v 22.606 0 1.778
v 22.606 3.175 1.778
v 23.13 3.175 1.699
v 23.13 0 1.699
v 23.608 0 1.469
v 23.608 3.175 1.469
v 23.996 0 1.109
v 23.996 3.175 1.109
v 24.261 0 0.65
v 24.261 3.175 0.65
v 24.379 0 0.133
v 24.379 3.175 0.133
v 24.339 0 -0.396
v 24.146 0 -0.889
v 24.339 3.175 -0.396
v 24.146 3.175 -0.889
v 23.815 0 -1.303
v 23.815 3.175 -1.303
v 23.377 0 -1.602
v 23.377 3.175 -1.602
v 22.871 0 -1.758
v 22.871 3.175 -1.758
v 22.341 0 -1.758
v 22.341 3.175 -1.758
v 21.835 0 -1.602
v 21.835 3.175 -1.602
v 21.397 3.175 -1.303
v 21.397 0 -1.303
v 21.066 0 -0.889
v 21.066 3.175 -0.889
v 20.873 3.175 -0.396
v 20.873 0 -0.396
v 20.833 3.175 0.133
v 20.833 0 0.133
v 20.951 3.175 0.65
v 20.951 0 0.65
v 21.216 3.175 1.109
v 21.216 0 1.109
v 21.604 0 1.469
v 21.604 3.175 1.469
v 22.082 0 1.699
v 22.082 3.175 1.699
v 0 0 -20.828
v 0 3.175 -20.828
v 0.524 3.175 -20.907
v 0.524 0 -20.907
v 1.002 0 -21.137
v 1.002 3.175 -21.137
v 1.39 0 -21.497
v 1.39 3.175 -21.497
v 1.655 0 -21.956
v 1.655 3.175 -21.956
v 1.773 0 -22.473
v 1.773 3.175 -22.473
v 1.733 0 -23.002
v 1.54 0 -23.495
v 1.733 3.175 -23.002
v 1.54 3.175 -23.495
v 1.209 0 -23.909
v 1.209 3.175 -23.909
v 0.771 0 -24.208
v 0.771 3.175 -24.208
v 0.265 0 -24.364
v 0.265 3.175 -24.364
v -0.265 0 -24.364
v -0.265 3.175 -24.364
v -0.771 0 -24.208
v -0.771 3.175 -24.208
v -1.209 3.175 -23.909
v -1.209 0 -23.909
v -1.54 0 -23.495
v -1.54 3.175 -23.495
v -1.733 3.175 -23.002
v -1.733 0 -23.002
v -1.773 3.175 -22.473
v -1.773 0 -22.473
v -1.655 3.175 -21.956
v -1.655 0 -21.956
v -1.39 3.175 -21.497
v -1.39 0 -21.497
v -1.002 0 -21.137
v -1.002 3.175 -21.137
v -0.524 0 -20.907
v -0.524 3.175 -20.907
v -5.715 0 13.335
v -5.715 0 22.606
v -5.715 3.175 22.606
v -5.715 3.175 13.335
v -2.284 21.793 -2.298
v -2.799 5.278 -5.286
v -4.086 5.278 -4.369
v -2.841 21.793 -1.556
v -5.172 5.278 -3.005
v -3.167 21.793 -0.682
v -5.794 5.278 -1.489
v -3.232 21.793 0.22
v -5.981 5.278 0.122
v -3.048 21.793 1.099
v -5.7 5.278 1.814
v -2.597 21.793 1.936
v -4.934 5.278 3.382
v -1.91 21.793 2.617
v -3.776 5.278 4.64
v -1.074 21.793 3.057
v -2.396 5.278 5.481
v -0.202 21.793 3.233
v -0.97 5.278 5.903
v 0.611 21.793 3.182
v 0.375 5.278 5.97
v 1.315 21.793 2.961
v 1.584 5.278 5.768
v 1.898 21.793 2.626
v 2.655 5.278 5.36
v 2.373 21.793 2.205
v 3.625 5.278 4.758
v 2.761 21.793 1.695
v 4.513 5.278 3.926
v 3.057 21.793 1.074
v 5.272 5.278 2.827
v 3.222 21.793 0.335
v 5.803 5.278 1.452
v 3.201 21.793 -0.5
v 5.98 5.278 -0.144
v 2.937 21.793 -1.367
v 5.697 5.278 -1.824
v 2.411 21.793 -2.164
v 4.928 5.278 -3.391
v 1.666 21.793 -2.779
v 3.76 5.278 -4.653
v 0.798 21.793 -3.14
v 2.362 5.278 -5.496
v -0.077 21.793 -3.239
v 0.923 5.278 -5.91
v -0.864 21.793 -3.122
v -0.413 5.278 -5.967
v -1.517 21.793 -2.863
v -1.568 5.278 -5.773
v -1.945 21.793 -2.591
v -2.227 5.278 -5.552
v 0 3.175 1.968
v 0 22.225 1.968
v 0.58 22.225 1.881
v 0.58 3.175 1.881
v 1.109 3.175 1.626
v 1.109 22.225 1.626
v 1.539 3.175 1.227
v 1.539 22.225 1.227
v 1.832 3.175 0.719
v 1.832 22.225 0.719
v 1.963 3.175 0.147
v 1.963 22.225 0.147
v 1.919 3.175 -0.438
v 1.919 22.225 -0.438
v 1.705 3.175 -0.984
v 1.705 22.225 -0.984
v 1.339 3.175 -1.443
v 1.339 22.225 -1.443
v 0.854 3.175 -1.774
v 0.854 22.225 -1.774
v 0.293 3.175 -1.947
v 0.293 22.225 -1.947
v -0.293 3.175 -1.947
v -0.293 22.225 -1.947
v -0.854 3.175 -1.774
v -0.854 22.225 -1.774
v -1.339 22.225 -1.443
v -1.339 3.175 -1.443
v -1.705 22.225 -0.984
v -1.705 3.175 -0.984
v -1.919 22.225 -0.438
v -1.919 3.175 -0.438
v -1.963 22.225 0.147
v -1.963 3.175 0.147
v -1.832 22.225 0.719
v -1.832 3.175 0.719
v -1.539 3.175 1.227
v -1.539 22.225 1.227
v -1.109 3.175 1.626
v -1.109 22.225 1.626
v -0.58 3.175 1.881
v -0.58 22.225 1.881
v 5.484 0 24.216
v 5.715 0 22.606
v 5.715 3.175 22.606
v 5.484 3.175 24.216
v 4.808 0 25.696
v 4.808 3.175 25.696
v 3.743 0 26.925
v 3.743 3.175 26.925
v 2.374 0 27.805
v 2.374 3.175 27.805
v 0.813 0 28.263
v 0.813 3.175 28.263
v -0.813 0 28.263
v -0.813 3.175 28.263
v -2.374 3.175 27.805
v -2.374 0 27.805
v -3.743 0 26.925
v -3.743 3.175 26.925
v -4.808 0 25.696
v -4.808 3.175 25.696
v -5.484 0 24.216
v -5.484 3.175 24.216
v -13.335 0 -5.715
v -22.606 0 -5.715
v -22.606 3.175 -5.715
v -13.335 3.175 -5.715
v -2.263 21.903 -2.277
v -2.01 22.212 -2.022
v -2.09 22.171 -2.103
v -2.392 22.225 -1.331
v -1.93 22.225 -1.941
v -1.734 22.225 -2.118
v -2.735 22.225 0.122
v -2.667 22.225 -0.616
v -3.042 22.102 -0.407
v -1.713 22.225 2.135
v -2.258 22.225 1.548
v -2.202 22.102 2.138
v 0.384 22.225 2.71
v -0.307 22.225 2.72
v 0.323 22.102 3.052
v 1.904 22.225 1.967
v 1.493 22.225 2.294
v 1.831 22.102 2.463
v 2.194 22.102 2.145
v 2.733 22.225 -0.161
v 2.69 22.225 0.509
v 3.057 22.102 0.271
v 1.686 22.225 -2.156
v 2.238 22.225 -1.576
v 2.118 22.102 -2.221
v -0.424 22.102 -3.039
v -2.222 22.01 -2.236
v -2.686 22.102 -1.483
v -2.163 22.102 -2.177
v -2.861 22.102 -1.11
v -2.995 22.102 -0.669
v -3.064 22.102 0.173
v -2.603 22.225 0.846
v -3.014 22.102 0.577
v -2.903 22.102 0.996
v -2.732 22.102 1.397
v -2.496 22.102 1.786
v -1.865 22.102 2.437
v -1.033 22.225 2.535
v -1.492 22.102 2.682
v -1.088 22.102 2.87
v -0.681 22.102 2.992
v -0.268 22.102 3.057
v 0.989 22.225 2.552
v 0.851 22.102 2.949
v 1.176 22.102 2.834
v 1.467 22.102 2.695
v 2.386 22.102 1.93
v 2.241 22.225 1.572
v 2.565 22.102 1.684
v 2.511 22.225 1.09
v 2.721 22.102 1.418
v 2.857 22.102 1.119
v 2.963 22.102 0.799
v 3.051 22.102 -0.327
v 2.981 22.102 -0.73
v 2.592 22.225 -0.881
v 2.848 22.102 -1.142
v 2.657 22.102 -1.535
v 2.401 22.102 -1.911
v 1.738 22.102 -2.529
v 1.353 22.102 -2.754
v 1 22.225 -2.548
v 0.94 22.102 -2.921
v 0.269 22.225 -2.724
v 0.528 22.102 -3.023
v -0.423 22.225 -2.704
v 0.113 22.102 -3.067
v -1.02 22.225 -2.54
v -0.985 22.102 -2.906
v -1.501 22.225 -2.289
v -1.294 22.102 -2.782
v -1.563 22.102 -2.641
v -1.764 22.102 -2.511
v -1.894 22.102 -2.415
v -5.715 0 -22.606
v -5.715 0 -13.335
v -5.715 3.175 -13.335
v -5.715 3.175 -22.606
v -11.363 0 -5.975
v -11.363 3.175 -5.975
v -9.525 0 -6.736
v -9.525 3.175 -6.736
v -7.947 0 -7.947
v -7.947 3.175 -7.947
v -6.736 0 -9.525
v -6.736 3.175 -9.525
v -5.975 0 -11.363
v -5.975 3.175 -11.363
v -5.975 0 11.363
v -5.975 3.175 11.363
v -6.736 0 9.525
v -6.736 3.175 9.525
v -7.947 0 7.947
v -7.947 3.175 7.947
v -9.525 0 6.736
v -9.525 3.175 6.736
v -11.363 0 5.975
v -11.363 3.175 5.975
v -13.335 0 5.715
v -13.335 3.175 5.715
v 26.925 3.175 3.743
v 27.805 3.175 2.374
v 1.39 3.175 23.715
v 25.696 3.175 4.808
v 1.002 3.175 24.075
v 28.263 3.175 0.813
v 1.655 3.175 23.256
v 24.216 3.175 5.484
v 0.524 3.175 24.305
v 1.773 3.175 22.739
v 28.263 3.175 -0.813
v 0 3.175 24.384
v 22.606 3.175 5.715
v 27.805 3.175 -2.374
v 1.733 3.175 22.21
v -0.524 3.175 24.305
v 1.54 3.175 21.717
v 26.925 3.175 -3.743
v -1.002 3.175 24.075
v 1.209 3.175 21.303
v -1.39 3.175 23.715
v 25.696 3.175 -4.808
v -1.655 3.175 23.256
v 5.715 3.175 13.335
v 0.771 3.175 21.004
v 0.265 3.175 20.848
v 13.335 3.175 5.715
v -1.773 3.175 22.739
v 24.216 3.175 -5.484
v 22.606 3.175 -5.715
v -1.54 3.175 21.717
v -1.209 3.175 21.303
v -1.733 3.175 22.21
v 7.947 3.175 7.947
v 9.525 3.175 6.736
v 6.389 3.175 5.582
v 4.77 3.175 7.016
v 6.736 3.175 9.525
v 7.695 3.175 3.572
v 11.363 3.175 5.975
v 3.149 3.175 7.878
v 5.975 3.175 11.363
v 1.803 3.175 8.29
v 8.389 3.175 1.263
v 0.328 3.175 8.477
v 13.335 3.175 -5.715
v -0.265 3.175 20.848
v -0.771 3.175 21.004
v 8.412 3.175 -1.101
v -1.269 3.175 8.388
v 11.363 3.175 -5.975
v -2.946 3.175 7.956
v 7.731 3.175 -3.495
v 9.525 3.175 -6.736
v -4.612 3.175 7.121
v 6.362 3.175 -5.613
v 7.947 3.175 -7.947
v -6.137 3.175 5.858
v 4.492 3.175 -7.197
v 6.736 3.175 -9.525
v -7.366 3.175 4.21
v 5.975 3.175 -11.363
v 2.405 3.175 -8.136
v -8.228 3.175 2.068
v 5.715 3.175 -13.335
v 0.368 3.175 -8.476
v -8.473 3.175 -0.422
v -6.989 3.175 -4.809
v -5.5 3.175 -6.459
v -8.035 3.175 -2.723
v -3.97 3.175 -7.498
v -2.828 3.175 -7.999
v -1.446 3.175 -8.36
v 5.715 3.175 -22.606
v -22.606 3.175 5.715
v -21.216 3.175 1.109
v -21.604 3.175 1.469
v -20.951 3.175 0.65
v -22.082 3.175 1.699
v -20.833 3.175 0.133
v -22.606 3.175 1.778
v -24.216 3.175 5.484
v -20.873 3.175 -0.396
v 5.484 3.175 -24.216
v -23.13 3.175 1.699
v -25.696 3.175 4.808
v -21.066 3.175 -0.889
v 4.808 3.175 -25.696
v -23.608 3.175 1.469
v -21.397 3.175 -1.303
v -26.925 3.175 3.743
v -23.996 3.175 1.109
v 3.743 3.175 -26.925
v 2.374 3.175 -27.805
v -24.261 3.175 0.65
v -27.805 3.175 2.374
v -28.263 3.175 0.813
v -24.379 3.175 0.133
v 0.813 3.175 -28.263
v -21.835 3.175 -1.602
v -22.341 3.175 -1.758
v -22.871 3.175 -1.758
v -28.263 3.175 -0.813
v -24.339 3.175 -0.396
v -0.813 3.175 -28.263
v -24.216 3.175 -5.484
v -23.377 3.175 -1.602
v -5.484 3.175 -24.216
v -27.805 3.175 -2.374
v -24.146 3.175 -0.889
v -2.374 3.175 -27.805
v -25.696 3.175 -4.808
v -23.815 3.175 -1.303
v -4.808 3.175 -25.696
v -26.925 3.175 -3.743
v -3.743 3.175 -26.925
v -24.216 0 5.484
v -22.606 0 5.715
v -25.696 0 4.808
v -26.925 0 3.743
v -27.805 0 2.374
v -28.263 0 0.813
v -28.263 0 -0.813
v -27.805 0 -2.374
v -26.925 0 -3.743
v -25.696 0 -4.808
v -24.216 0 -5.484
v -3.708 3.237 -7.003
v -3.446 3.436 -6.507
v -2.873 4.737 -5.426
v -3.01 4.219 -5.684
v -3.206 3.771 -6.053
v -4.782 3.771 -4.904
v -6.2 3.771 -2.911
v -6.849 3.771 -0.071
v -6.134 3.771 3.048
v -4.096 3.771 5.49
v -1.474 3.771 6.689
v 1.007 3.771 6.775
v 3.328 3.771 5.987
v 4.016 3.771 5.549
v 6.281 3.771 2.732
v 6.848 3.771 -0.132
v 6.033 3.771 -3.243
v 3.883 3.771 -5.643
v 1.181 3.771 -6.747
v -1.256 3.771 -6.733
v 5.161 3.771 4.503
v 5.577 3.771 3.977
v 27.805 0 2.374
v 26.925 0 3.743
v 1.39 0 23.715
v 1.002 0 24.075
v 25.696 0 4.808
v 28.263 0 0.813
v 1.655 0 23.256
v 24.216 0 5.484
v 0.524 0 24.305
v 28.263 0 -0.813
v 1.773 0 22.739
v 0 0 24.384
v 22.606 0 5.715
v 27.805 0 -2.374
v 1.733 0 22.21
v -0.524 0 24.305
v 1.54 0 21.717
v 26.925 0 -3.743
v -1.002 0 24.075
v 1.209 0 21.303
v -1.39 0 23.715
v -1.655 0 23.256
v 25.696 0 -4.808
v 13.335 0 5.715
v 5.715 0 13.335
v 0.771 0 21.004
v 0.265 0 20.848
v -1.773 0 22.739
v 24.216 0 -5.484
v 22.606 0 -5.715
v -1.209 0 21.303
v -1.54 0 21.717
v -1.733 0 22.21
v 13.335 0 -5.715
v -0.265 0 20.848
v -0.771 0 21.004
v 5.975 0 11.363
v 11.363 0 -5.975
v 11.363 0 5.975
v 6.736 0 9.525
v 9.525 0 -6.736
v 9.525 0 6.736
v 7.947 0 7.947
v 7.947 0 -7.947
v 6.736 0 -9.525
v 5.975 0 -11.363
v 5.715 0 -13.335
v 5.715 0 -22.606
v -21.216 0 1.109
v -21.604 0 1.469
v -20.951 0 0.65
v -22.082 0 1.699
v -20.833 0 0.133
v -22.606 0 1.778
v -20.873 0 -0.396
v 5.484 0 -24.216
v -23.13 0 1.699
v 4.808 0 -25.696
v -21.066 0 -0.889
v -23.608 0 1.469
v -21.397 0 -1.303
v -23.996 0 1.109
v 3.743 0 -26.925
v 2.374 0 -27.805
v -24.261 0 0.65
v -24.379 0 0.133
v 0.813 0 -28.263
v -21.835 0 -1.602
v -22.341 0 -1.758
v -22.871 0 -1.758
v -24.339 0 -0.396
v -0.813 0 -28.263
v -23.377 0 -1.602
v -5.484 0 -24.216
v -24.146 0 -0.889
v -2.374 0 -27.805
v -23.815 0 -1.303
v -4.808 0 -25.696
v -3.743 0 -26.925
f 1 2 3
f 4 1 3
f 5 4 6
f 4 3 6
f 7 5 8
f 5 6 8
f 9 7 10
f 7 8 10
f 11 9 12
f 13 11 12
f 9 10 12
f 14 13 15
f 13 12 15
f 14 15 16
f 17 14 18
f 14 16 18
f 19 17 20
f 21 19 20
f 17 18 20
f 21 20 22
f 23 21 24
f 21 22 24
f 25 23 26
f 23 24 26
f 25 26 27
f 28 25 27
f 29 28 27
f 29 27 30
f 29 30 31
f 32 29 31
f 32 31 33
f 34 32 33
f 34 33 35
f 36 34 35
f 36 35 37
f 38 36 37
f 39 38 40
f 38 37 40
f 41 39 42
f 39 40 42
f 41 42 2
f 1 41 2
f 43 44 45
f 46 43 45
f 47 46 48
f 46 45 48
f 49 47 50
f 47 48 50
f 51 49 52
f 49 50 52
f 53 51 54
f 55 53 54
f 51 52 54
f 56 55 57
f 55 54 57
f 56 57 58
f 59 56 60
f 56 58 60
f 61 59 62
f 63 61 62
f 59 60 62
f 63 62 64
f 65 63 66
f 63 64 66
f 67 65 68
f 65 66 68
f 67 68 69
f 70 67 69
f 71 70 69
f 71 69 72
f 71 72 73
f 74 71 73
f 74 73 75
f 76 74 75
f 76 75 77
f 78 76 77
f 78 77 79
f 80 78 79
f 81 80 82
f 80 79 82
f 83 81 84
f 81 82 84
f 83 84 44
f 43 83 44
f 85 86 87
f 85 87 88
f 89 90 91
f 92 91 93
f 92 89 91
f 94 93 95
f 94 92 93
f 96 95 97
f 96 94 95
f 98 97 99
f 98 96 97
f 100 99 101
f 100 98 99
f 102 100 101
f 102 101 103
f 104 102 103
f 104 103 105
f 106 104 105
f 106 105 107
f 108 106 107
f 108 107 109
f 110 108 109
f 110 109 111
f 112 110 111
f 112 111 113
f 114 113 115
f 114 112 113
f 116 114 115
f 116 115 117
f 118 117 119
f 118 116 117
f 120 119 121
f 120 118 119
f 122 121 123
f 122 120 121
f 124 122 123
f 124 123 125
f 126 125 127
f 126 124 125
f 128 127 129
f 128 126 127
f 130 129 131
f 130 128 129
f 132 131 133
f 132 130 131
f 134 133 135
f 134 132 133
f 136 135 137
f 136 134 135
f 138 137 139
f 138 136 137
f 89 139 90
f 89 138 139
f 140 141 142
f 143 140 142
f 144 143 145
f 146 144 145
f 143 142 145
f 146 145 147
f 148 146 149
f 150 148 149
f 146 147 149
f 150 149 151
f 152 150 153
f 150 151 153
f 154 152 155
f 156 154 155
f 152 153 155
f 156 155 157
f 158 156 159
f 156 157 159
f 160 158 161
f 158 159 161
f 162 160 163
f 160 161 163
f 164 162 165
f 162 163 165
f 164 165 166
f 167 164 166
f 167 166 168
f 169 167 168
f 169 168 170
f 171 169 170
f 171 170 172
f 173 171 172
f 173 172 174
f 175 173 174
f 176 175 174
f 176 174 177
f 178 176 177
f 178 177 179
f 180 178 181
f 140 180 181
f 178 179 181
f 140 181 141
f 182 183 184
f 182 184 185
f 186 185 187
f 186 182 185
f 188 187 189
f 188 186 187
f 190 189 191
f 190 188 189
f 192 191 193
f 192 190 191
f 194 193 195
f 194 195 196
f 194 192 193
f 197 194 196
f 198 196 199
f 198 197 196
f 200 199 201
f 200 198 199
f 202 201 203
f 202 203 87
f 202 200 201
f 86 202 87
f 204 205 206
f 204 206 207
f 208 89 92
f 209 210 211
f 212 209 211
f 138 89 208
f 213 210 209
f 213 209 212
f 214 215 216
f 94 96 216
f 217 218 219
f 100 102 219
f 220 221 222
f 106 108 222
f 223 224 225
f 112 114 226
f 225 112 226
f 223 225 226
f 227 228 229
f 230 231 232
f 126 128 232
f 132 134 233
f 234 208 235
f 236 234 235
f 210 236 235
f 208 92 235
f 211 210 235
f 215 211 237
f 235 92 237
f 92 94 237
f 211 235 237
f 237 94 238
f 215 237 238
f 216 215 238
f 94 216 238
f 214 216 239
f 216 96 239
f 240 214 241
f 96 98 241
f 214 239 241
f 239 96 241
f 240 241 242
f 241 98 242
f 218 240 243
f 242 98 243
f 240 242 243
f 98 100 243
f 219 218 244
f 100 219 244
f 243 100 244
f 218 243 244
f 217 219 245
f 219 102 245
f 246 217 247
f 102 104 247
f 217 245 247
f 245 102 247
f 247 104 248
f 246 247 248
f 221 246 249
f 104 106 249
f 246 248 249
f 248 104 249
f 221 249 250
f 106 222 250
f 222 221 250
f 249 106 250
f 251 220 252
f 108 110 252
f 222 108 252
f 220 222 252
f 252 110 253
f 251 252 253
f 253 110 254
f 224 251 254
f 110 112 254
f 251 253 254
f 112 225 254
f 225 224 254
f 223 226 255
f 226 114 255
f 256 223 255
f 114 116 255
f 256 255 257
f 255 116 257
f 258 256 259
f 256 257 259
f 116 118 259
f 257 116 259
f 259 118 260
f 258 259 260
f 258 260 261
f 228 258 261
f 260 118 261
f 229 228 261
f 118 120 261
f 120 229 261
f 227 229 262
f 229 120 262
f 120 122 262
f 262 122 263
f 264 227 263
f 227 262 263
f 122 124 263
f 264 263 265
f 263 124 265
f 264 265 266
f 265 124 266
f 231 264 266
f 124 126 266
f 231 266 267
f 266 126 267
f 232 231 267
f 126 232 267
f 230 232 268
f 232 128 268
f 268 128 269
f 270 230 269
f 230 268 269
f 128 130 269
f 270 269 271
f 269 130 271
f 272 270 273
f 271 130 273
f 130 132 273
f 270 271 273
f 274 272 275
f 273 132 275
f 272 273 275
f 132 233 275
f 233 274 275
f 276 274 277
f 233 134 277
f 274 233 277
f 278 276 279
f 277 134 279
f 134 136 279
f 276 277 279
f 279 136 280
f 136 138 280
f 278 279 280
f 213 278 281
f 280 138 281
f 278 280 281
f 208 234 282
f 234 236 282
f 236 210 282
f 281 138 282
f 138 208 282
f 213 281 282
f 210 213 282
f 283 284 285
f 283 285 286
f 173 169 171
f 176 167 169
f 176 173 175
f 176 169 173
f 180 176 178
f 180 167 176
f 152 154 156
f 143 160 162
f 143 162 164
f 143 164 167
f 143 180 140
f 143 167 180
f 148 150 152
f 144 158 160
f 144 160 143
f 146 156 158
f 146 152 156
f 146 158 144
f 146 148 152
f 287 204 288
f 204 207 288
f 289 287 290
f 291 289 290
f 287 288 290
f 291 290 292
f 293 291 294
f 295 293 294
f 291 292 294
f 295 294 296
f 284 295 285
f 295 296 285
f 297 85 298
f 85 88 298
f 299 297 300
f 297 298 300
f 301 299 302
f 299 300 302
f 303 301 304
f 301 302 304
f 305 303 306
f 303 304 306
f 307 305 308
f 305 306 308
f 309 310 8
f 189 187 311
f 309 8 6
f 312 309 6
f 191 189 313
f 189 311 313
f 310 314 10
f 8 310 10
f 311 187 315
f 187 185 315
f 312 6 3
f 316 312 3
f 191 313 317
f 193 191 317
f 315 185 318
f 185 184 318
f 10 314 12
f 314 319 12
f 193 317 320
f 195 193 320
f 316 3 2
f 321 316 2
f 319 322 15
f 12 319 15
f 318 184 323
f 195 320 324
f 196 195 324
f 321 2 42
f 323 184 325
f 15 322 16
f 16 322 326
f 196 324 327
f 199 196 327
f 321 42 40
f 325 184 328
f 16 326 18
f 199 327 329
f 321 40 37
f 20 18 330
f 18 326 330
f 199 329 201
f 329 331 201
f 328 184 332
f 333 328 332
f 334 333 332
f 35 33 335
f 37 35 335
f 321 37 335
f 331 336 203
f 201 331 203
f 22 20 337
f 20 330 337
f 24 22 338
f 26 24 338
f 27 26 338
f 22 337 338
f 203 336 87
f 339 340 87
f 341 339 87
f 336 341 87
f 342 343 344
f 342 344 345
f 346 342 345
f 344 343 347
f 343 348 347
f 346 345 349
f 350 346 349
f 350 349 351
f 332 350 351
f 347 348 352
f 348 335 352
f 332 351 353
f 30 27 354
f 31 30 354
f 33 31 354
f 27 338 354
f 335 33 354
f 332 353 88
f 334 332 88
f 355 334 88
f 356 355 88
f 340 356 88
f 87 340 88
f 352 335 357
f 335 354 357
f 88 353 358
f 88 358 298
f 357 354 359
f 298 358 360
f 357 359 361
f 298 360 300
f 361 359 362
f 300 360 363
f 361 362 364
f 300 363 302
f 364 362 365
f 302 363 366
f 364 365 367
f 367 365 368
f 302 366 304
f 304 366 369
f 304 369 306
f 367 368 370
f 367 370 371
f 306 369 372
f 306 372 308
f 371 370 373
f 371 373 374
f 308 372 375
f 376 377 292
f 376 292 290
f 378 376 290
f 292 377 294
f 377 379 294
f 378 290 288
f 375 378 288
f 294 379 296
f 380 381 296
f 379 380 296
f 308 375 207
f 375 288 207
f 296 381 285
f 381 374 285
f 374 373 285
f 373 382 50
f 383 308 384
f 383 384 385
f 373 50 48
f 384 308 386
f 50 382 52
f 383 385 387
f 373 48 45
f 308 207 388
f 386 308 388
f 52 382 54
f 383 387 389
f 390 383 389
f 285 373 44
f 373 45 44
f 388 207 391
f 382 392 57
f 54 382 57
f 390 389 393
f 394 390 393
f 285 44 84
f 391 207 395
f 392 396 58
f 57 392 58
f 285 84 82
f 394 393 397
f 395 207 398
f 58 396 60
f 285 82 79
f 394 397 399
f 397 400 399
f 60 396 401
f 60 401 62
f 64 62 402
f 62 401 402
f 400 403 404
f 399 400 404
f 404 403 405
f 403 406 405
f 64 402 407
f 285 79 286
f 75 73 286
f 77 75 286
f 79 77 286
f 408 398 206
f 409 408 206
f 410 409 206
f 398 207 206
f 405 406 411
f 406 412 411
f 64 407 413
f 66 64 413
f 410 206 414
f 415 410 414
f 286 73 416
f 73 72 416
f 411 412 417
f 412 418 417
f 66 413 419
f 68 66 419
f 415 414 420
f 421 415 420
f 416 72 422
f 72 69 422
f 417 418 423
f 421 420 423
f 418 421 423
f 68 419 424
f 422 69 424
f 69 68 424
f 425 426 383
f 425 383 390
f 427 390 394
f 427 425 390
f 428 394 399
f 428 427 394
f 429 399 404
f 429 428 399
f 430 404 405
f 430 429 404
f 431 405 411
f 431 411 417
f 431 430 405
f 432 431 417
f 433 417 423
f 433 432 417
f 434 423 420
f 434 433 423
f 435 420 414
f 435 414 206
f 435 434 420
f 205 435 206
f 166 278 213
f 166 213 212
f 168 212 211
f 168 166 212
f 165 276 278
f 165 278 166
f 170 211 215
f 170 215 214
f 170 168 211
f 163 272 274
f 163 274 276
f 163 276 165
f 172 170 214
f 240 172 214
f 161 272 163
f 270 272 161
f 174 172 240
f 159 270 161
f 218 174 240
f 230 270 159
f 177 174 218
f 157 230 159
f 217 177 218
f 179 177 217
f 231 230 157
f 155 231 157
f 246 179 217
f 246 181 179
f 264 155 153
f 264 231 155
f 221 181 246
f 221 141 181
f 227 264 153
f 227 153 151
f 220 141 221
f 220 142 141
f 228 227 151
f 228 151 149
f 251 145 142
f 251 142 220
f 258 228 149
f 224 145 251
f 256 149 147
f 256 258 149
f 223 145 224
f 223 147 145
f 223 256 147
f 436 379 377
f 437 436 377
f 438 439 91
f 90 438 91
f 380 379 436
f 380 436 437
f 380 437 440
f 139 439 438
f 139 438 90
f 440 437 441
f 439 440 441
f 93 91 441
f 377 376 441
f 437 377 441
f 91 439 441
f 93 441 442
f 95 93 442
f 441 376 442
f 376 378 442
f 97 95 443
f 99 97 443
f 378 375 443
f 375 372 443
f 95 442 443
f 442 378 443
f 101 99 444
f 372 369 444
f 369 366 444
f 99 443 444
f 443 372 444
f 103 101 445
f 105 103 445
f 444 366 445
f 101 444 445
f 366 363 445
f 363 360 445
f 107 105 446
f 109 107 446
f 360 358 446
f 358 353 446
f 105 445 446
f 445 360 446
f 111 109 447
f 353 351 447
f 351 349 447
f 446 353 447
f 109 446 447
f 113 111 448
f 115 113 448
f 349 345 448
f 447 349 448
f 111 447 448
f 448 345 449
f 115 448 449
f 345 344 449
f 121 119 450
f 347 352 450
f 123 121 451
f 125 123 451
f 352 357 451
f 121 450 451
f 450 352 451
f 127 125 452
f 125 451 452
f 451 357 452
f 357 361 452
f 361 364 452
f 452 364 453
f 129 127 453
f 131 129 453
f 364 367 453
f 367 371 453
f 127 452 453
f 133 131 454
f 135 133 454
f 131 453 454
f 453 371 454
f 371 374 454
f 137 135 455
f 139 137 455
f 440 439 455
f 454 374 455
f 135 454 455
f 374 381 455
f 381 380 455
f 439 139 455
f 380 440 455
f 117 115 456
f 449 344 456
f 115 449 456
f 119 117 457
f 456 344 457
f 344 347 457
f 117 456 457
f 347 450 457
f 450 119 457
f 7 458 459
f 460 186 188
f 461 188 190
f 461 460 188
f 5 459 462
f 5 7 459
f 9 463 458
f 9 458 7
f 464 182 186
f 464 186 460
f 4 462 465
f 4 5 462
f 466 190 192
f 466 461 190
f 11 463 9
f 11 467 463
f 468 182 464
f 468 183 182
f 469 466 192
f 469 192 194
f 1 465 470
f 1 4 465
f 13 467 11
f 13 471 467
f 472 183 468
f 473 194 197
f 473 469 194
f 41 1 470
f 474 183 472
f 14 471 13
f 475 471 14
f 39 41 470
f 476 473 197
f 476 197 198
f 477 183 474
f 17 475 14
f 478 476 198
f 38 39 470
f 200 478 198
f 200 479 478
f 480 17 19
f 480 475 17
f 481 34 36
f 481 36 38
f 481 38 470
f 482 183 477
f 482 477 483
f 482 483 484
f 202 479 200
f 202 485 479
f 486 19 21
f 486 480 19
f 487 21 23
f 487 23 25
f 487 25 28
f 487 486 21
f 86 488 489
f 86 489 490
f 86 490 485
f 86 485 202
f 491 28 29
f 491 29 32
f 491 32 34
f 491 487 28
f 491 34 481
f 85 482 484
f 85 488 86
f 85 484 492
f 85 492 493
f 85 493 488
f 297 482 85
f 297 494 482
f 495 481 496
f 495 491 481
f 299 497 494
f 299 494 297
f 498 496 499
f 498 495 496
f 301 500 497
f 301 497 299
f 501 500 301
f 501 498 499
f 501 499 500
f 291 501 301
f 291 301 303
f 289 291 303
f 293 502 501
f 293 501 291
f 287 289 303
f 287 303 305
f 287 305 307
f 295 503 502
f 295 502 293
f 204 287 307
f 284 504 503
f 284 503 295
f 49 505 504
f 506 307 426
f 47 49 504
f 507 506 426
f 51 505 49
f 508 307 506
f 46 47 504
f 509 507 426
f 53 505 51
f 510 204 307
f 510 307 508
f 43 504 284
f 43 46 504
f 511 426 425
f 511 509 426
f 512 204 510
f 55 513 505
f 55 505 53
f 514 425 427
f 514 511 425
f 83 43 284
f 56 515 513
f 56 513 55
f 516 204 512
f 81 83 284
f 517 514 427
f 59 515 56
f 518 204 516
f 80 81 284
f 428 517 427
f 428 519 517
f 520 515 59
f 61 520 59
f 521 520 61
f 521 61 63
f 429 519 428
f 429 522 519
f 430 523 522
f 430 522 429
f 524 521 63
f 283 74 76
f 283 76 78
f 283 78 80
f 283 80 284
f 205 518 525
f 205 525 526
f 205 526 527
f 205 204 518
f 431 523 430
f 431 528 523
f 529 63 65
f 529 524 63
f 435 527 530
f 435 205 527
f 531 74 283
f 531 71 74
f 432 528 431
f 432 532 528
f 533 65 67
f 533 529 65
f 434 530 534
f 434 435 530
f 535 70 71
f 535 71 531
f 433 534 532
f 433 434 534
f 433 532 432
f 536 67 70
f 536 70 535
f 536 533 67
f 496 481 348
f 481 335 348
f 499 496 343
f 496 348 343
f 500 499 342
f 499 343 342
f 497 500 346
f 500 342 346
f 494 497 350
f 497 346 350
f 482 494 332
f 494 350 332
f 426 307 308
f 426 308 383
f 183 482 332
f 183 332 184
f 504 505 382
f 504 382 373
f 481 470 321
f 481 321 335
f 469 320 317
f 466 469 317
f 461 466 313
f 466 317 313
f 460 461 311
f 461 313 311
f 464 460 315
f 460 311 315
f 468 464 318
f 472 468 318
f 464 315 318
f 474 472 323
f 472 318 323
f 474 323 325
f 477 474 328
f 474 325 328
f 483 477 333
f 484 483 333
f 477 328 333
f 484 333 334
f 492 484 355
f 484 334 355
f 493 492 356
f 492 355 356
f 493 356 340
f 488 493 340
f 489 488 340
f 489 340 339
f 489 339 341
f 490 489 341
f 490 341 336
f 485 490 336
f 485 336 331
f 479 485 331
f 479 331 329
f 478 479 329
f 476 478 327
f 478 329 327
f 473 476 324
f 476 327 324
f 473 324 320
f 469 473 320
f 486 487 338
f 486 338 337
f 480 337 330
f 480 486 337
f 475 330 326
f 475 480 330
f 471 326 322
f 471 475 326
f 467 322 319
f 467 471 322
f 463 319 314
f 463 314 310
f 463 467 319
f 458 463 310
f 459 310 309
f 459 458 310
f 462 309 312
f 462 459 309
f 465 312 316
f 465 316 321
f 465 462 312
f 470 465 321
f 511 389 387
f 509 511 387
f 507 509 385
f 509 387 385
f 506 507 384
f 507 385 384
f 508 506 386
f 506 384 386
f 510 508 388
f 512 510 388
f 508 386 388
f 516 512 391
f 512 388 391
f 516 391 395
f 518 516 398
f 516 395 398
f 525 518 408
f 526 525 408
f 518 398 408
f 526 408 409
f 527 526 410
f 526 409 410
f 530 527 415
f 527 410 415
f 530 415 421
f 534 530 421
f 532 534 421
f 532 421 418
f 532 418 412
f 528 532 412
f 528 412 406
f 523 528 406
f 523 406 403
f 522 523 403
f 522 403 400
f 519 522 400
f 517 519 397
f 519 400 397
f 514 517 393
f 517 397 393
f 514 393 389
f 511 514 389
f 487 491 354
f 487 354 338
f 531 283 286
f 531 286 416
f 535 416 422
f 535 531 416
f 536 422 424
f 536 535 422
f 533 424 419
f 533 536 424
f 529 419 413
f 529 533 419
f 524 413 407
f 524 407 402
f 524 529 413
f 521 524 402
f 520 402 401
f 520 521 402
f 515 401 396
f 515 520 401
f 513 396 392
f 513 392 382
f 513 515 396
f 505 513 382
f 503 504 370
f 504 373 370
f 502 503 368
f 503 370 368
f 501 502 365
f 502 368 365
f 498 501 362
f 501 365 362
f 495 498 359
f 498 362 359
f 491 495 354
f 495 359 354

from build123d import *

# Parameters (mm, degrees)
BOSS_EXTRUDE1_DEPTH = 3.175
FILLET1_R           = 7.62
FILLET2_R           = 2.54
SKETCH4_R           = 1.9685
CUT_EXTRUDE1_DEPTH  = 19.05
FILLET3_R           = 0.508
SKETCH6_R           = 1.778
CUT_EXTRUDE2_DEPTH  = 3.175


with BuildPart() as part:
    # Sketch1 → Boss-Extrude1 (new body)
    with BuildSketch(Plane(origin=(0, 0, 0), x_dir=(1, 0, 0), z_dir=(0, 1, 0))):
        with BuildLine():
            Line((-22.606, 5.715), (22.606, 5.715))
            ThreePointArc((22.606, 5.715), (28.321, 0), (22.606, -5.715))
            Line((22.606, -5.715), (-22.606, -5.715))
            ThreePointArc((-22.606, -5.715), (-28.321, 0), (-22.606, 5.715))
        make_face()
        with BuildLine():
            Line((-5.715, -22.606), (-5.715, 22.606))
            ThreePointArc((-5.715, 22.606), (0, 28.321), (5.715, 22.606))
            Line((5.715, 22.606), (5.715, -22.606))
            ThreePointArc((5.715, -22.606), (0, -28.321), (-5.715, -22.606))
        make_face()
    extrude(amount=BOSS_EXTRUDE1_DEPTH)

    # Fillet1
    fillet1_edges = [part.edges().sort_by_distance(p)[0] for p in [
        (-5.715, 1.5875, -5.715),
        (-5.715, 1.5875, 5.715),
        (5.715, 1.5875, -5.715),
        (5.715, 1.5875, 5.715),
    ]]
    fillet(fillet1_edges, radius=FILLET1_R)

    # Loft1: read off the stored shape, not the designer's step
    # Loft1: loft between two sections, ruled curve by curve
    loft1_from = [
        Edge.make_bspline([(-2.865050686, 3.175, -5.666920201), (-14.198891088, 3.175, 0.063181171), (-8.468789716, 3.175, 11.397021573), (2.865050686, 3.175, 5.666920201), (14.198891088, 3.175, -0.063181171), (8.468789716, 3.175, -11.397021573), (-2.865050686, 3.175, -5.666920201)], [0, 0, 0, 0, 0.5, 0.5, 0.5, 1, 1, 1, 1], 3, [1, 0.333333333, 0.333333333, 1, 0.333333333, 0.333333333, 1]),
    ]
    loft1_to = [
        Edge.make_bspline([(-2.270310983, 22.225, -2.219529914), (-6.709370811, 22.225, 2.321092053), (-2.168748845, 22.225, 6.760151881), (2.270310983, 22.225, 2.219529914), (6.709370811, 22.225, -2.321092053), (2.168748845, 22.225, -6.760151881), (-2.270310983, 22.225, -2.219529914)], [0, 0, 0, 0, 0.5, 0.5, 0.5, 1, 1, 1, 1], 3, [1, 0.333333333, 0.333333333, 1, 0.333333333, 0.333333333, 1]),
    ]
    loft1 = Solid(Shell([*[Face.make_surface_from_curves(loft1_from[k], loft1_to[k]) for k in range(1)], Face(Wire(loft1_from)), Face(Wire(loft1_to))]))
    add(loft1)

    # Fillet2
    fillet2_edges = [part.edges().sort_by_distance(p)[0] for p in [
        (2.865050686, 3.175, 5.666920201),
    ]]
    fillet(fillet2_edges, radius=FILLET2_R)

    # Sketch4 → Cut-Extrude1 (cut)
    with BuildSketch(Plane(origin=(0, 22.225, 0), x_dir=(1, 0, 0), z_dir=(0, 1, 0))):
        with Locations(Location((0, 0, 0), (0, 0, 270))):
            Circle(SKETCH4_R)
    extrude(amount=-CUT_EXTRUDE1_DEPTH, mode=Mode.SUBTRACT)

    # Fillet3
    fillet3_edges = [part.edges().sort_by_distance(p)[0] for p in [
        (2.270310983, 22.225, 2.219529914),
    ]]
    fillet(fillet3_edges, radius=FILLET3_R)

    # Sketch6 → Cut-Extrude2 (cut)
    with BuildSketch(Plane(origin=(0, 3.175, 0), x_dir=(1, 0, 0), z_dir=(0, 1, 0))):
        with Locations(Location((-22.606, 0, 0), (0, 0, 270))):
            Circle(SKETCH6_R)
        with Locations(Location((22.606, 0, 0), (0, 0, 270))):
            Circle(SKETCH6_R)
        with Locations(Location((0, 22.606, 0), (0, 0, 270))):
            Circle(SKETCH6_R)
        with Locations(Location((0, -22.606, 0), (0, 0, 270))):
            Circle(SKETCH6_R)
    extrude(amount=-CUT_EXTRUDE2_DEPTH, mode=Mode.SUBTRACT)


solid = part.part
